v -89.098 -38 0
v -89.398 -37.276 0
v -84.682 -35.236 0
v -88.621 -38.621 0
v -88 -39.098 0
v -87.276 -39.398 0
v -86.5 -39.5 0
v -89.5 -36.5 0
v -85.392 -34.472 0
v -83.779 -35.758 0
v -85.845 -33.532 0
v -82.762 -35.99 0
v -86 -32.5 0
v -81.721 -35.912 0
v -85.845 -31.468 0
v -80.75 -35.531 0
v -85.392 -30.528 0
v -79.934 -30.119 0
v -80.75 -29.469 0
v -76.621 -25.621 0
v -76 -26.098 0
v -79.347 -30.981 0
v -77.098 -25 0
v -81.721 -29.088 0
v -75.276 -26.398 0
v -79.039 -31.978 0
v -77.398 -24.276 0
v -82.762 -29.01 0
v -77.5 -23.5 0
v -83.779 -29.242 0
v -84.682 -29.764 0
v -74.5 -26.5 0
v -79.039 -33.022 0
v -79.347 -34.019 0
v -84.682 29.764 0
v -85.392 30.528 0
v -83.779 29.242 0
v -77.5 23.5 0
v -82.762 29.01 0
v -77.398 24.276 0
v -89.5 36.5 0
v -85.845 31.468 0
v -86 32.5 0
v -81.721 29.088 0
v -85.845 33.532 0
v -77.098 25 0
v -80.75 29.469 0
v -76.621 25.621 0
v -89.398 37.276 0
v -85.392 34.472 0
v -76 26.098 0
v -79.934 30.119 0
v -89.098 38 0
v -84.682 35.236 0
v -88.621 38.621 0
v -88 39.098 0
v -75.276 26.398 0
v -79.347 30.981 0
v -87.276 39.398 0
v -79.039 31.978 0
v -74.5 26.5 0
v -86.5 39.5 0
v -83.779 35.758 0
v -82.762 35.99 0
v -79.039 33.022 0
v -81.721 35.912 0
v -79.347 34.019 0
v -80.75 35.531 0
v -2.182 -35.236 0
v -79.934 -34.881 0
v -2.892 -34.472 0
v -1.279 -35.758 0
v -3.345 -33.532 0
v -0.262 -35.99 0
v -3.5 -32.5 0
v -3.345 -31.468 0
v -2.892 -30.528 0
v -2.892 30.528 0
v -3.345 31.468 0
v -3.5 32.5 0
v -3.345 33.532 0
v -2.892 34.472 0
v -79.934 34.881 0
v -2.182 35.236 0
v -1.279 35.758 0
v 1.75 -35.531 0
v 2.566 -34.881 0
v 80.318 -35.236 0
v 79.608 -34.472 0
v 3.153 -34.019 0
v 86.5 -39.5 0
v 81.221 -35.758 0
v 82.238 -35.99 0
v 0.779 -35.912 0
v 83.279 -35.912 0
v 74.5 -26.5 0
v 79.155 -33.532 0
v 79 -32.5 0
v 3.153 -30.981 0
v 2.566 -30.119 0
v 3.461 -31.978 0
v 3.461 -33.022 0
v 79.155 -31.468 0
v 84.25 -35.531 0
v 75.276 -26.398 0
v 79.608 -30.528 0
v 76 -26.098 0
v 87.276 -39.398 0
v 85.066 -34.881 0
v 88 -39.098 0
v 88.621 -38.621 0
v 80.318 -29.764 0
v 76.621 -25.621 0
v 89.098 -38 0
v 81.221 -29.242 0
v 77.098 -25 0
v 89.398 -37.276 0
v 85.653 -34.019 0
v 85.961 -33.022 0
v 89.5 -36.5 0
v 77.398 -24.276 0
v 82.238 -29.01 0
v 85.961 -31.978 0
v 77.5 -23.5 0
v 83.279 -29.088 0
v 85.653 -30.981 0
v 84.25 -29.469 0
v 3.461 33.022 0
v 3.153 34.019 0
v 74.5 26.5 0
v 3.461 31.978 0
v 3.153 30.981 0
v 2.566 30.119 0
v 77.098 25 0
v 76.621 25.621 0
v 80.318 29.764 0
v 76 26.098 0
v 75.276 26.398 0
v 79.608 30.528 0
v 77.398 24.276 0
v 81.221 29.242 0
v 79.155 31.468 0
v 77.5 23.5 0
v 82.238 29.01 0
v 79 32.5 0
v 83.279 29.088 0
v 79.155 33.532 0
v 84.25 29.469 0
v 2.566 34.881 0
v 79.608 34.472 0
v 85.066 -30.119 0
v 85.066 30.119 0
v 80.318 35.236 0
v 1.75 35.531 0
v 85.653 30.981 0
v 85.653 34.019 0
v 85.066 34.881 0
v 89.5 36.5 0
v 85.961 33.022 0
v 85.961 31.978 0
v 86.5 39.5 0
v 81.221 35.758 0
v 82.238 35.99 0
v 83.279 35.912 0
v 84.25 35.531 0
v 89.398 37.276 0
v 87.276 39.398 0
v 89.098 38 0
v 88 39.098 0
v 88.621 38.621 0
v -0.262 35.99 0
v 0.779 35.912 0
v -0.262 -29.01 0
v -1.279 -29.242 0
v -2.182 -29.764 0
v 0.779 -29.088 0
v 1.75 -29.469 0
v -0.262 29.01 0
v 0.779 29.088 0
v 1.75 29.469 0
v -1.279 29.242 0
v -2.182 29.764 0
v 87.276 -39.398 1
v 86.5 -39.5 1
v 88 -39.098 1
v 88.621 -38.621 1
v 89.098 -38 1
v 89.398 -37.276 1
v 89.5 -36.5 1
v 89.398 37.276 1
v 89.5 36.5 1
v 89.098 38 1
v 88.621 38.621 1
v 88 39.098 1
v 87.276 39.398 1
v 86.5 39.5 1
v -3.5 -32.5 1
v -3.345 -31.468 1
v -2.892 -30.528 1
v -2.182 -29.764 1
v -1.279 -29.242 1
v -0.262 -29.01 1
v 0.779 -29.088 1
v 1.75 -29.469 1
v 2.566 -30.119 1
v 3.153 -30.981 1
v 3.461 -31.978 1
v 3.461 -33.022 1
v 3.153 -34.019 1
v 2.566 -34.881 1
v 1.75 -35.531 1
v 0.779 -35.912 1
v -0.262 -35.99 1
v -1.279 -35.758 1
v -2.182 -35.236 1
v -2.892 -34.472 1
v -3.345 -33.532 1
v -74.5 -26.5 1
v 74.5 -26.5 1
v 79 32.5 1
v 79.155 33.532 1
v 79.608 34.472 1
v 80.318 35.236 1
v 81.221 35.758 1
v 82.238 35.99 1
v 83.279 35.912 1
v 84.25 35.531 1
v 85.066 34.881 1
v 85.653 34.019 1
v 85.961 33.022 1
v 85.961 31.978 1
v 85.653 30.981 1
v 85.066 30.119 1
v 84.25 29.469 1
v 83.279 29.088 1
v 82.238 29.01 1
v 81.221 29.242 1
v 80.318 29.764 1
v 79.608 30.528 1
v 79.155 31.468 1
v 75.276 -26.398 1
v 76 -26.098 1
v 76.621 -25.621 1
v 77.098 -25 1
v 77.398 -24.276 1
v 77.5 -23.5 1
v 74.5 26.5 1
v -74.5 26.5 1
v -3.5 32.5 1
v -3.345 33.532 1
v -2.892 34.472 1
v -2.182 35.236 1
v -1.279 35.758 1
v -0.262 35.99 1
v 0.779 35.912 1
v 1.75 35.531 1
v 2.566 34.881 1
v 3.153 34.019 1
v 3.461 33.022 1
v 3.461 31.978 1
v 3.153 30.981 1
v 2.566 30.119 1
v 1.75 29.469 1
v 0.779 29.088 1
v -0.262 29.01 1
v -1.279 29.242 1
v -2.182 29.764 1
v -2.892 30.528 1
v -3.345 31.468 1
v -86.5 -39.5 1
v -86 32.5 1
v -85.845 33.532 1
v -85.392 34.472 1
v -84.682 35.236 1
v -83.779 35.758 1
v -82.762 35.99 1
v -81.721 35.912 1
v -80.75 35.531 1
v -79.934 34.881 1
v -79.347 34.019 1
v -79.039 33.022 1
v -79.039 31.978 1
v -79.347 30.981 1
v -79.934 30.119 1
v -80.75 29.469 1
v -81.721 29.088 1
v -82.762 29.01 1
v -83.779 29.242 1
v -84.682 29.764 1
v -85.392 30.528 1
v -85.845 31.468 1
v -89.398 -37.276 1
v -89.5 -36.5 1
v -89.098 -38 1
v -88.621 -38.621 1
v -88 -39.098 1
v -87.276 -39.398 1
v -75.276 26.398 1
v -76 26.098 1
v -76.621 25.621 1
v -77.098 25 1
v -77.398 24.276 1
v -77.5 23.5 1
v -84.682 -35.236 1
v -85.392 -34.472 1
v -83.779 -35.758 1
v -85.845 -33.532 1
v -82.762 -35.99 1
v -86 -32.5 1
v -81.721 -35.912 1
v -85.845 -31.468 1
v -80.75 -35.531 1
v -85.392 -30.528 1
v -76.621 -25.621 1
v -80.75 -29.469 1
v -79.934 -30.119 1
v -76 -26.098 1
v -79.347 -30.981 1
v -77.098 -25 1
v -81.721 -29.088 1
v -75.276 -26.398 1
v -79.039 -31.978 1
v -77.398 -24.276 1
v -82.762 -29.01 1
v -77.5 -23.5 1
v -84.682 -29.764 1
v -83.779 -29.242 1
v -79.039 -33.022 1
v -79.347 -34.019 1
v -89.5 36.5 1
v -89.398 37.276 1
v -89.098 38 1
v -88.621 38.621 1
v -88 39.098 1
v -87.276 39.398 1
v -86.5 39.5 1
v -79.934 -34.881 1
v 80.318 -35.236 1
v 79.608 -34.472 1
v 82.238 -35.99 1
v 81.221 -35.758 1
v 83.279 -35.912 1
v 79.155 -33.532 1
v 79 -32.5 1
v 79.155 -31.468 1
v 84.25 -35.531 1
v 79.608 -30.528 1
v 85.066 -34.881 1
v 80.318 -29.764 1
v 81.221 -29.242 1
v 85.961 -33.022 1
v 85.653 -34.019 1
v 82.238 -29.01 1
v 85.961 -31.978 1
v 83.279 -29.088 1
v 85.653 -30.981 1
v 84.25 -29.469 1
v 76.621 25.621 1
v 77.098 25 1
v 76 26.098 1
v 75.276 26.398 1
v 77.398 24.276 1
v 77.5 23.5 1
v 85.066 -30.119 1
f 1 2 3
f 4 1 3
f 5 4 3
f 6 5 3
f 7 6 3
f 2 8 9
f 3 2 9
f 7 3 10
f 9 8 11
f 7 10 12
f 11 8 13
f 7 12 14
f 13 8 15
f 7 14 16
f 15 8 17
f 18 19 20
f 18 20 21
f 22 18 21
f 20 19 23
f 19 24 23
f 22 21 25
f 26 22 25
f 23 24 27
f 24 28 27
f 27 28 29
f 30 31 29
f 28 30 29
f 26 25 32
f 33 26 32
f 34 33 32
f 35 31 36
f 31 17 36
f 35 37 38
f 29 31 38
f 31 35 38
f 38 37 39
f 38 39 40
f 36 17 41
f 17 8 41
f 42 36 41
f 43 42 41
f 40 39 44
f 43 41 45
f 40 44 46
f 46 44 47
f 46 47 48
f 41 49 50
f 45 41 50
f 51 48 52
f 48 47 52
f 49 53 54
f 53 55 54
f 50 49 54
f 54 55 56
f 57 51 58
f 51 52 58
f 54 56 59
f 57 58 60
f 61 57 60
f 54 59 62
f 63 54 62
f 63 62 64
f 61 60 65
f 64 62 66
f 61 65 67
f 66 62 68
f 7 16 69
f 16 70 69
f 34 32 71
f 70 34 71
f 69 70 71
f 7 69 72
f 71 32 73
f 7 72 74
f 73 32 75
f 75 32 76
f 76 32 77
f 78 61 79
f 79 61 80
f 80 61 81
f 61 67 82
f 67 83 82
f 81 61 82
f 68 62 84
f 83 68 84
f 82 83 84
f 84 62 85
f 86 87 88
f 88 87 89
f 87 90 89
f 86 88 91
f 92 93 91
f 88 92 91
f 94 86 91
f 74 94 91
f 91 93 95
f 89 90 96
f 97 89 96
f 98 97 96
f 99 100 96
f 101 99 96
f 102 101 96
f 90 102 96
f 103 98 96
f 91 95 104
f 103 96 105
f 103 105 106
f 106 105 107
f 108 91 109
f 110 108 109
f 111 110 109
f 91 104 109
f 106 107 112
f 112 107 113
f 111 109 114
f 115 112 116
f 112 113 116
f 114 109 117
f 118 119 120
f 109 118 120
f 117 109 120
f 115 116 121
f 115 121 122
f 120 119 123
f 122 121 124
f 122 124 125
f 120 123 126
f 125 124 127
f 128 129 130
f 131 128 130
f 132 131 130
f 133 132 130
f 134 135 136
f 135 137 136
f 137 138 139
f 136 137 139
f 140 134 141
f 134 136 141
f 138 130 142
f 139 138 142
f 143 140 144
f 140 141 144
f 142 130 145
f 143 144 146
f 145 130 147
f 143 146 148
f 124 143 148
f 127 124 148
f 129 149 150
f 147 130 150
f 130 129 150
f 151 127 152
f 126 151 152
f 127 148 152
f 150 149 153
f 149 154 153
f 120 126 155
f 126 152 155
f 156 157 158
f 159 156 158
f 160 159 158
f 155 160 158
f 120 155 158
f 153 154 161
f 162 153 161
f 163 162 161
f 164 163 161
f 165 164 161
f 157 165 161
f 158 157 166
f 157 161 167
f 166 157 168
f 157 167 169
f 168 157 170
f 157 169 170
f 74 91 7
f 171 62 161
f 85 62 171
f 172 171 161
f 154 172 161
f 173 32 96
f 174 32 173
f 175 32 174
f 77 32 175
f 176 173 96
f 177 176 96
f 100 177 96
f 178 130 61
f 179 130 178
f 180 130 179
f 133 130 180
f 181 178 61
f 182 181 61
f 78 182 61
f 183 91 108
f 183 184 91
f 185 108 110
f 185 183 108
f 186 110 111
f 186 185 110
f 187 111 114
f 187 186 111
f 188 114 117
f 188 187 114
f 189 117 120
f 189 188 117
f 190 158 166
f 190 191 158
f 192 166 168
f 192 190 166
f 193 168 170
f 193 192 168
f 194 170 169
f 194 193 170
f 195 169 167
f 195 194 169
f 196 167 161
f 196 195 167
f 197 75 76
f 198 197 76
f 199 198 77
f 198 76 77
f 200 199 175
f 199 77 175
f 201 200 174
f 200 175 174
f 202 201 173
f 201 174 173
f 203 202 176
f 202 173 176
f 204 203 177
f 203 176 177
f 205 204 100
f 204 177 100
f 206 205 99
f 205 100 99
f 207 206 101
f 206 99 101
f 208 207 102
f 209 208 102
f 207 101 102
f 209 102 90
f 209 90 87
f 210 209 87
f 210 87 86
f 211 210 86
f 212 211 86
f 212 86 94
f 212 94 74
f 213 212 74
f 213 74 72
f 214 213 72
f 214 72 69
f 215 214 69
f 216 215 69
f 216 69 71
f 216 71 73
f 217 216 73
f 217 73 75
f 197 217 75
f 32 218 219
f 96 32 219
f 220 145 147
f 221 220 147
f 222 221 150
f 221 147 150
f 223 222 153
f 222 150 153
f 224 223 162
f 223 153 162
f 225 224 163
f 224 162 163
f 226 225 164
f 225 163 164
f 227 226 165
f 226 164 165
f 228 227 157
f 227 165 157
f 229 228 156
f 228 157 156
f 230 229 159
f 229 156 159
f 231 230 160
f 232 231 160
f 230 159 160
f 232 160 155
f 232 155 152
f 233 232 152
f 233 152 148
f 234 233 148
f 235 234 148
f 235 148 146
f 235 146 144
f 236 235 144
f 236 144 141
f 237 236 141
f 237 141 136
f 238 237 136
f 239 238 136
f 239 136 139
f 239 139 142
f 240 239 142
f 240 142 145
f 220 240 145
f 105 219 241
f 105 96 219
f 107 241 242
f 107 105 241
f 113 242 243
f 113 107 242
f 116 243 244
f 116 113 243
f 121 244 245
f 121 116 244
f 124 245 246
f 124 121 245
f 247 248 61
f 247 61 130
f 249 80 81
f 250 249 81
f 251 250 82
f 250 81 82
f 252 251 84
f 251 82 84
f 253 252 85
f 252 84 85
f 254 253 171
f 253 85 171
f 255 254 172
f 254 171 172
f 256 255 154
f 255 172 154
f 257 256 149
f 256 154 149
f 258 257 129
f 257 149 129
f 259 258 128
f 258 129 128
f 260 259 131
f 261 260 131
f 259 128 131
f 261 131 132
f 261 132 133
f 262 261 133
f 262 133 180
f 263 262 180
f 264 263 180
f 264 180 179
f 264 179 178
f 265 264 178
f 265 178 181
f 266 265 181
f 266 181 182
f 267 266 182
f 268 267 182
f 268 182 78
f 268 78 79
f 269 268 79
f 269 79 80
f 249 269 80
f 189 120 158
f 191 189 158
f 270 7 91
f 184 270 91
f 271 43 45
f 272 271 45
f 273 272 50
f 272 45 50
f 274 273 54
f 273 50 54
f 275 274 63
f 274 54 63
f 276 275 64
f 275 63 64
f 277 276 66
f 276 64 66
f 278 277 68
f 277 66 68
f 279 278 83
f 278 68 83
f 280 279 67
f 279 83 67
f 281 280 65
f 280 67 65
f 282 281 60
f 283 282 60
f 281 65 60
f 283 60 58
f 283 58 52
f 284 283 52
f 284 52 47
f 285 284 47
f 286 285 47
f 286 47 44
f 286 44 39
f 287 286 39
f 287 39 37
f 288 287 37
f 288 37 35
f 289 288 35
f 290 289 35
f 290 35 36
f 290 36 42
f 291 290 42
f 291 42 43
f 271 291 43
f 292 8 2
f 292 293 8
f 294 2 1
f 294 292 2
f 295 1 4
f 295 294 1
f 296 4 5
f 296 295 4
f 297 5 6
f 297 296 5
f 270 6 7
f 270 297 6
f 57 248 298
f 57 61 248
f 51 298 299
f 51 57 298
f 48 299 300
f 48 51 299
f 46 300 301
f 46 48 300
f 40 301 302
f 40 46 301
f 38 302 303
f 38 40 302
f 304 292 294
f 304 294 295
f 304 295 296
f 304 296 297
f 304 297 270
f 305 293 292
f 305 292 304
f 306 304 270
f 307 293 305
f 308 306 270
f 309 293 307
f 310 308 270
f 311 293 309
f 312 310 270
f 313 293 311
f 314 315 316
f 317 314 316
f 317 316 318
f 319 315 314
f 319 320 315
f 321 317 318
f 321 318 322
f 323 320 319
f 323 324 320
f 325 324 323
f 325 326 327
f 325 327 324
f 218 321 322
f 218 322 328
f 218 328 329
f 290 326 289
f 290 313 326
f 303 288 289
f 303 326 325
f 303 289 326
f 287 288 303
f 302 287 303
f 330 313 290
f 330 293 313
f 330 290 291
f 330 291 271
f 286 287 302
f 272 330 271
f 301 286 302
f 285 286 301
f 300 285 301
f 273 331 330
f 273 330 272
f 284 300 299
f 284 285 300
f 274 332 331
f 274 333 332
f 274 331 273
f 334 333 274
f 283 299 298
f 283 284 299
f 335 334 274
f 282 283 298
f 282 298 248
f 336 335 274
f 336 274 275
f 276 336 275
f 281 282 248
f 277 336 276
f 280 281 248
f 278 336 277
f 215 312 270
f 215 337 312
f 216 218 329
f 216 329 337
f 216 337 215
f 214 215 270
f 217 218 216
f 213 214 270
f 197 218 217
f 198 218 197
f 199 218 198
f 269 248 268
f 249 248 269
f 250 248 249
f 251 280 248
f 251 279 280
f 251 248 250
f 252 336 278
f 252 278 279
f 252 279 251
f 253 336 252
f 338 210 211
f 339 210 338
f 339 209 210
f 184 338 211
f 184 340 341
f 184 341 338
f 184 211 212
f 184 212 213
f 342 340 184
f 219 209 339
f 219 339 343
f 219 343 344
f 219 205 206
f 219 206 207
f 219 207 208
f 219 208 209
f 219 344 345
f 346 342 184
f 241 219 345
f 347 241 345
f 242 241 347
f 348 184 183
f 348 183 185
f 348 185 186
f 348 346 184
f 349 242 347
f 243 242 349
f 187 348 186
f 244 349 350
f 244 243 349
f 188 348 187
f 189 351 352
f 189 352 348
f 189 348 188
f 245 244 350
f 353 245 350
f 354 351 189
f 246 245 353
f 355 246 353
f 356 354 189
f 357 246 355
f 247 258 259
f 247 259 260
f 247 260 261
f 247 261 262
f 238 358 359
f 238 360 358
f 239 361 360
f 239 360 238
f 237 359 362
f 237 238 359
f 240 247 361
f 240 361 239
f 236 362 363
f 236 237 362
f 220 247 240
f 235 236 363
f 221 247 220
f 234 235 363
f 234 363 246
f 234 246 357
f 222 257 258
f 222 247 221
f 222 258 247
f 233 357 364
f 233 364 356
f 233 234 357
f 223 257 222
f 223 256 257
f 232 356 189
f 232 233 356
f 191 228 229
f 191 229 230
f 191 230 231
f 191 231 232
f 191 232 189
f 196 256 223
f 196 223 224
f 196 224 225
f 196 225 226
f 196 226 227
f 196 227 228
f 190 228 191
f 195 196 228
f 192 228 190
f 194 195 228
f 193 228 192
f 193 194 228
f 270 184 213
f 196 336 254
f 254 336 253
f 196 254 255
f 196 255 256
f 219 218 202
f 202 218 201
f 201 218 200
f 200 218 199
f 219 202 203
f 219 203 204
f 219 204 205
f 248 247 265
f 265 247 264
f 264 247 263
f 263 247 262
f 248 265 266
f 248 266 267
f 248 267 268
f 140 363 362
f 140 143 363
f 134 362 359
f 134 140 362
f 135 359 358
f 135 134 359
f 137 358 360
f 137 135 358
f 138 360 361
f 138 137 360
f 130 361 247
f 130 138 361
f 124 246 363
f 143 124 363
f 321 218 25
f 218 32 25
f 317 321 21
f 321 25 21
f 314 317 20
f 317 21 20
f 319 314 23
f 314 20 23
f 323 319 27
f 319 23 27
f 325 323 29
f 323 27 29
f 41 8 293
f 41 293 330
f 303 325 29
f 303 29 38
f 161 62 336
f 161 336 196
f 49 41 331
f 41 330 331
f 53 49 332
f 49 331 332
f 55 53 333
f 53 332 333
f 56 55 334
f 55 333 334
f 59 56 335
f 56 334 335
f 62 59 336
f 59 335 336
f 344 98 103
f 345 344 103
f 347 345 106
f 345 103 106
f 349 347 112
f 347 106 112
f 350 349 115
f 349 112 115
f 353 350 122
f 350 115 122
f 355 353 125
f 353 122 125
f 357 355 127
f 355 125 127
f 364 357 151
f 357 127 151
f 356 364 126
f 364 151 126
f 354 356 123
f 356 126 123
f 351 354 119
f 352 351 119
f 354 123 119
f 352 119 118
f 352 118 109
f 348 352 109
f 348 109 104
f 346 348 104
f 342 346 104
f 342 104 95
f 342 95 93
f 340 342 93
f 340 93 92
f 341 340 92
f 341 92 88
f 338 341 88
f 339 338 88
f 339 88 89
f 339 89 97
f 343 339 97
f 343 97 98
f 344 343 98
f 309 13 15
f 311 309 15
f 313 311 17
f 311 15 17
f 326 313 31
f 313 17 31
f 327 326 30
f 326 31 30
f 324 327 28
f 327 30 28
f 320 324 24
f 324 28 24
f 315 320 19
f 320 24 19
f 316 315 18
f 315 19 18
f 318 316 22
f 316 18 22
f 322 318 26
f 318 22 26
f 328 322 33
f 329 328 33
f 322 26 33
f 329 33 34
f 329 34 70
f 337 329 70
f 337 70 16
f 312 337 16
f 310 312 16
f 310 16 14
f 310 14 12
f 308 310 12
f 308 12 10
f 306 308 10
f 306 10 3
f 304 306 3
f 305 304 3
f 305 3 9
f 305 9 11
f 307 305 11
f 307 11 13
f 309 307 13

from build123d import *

# Parameters (mm, degrees)
SKETCH1_W                = 179
SKETCH1_H                = 79
BOSS_EXTRUDE1_DEPTH      = 1
FILLET1_R                = 3
F_7_0_7_DIAMETER_HOLE1_D = 7
SKETCH4_W                = 155
SKETCH4_H                = 53
CUT_EXTRUDE1_DEPTH       = 98.834043155
FILLET2_R                = 3


with BuildPart() as part:
    # Sketch1 → Boss-Extrude1 (new body)
    with BuildSketch(Plane.XY):
        Rectangle(SKETCH1_W, SKETCH1_H)
    extrude(amount=BOSS_EXTRUDE1_DEPTH)

    # Fillet1
    fillet1_edges = [part.edges().sort_by_distance(p)[0] for p in [
        (89.5, -39.5, 0.5),
        (-89.5, -39.5, 0.5),
        (-89.5, 39.5, 0.5),
        (89.5, 39.5, 0.5),
    ]]
    fillet(fillet1_edges, radius=FILLET1_R)

    # Ø7.0 (7) Diameter Hole1 (through all)
    with Locations(Plane.XY.offset(1)):
        with Locations((0, 32.5), (-82.5, 32.5), (82.5, 32.5), (82.5, -32.5), (0, -32.5), (-82.5, -32.5)):
            Hole(F_7_0_7_DIAMETER_HOLE1_D / 2)

    # Sketch4 → Cut-Extrude1 (cut, through all)
    with BuildSketch(Plane.XY.offset(1)):
        Rectangle(SKETCH4_W, SKETCH4_H)
    extrude(amount=-CUT_EXTRUDE1_DEPTH, mode=Mode.SUBTRACT)

    # Fillet2
    fillet2_edges = [part.edges().sort_by_distance(p)[0] for p in [
        (-77.5, -26.5, 0.5),
        (-77.5, 26.5, 0.5),
        (77.5, 26.5, 0.5),
        (77.5, -26.5, 0.5),
    ]]
    fillet(fillet2_edges, radius=FILLET2_R)


solid = part.part
